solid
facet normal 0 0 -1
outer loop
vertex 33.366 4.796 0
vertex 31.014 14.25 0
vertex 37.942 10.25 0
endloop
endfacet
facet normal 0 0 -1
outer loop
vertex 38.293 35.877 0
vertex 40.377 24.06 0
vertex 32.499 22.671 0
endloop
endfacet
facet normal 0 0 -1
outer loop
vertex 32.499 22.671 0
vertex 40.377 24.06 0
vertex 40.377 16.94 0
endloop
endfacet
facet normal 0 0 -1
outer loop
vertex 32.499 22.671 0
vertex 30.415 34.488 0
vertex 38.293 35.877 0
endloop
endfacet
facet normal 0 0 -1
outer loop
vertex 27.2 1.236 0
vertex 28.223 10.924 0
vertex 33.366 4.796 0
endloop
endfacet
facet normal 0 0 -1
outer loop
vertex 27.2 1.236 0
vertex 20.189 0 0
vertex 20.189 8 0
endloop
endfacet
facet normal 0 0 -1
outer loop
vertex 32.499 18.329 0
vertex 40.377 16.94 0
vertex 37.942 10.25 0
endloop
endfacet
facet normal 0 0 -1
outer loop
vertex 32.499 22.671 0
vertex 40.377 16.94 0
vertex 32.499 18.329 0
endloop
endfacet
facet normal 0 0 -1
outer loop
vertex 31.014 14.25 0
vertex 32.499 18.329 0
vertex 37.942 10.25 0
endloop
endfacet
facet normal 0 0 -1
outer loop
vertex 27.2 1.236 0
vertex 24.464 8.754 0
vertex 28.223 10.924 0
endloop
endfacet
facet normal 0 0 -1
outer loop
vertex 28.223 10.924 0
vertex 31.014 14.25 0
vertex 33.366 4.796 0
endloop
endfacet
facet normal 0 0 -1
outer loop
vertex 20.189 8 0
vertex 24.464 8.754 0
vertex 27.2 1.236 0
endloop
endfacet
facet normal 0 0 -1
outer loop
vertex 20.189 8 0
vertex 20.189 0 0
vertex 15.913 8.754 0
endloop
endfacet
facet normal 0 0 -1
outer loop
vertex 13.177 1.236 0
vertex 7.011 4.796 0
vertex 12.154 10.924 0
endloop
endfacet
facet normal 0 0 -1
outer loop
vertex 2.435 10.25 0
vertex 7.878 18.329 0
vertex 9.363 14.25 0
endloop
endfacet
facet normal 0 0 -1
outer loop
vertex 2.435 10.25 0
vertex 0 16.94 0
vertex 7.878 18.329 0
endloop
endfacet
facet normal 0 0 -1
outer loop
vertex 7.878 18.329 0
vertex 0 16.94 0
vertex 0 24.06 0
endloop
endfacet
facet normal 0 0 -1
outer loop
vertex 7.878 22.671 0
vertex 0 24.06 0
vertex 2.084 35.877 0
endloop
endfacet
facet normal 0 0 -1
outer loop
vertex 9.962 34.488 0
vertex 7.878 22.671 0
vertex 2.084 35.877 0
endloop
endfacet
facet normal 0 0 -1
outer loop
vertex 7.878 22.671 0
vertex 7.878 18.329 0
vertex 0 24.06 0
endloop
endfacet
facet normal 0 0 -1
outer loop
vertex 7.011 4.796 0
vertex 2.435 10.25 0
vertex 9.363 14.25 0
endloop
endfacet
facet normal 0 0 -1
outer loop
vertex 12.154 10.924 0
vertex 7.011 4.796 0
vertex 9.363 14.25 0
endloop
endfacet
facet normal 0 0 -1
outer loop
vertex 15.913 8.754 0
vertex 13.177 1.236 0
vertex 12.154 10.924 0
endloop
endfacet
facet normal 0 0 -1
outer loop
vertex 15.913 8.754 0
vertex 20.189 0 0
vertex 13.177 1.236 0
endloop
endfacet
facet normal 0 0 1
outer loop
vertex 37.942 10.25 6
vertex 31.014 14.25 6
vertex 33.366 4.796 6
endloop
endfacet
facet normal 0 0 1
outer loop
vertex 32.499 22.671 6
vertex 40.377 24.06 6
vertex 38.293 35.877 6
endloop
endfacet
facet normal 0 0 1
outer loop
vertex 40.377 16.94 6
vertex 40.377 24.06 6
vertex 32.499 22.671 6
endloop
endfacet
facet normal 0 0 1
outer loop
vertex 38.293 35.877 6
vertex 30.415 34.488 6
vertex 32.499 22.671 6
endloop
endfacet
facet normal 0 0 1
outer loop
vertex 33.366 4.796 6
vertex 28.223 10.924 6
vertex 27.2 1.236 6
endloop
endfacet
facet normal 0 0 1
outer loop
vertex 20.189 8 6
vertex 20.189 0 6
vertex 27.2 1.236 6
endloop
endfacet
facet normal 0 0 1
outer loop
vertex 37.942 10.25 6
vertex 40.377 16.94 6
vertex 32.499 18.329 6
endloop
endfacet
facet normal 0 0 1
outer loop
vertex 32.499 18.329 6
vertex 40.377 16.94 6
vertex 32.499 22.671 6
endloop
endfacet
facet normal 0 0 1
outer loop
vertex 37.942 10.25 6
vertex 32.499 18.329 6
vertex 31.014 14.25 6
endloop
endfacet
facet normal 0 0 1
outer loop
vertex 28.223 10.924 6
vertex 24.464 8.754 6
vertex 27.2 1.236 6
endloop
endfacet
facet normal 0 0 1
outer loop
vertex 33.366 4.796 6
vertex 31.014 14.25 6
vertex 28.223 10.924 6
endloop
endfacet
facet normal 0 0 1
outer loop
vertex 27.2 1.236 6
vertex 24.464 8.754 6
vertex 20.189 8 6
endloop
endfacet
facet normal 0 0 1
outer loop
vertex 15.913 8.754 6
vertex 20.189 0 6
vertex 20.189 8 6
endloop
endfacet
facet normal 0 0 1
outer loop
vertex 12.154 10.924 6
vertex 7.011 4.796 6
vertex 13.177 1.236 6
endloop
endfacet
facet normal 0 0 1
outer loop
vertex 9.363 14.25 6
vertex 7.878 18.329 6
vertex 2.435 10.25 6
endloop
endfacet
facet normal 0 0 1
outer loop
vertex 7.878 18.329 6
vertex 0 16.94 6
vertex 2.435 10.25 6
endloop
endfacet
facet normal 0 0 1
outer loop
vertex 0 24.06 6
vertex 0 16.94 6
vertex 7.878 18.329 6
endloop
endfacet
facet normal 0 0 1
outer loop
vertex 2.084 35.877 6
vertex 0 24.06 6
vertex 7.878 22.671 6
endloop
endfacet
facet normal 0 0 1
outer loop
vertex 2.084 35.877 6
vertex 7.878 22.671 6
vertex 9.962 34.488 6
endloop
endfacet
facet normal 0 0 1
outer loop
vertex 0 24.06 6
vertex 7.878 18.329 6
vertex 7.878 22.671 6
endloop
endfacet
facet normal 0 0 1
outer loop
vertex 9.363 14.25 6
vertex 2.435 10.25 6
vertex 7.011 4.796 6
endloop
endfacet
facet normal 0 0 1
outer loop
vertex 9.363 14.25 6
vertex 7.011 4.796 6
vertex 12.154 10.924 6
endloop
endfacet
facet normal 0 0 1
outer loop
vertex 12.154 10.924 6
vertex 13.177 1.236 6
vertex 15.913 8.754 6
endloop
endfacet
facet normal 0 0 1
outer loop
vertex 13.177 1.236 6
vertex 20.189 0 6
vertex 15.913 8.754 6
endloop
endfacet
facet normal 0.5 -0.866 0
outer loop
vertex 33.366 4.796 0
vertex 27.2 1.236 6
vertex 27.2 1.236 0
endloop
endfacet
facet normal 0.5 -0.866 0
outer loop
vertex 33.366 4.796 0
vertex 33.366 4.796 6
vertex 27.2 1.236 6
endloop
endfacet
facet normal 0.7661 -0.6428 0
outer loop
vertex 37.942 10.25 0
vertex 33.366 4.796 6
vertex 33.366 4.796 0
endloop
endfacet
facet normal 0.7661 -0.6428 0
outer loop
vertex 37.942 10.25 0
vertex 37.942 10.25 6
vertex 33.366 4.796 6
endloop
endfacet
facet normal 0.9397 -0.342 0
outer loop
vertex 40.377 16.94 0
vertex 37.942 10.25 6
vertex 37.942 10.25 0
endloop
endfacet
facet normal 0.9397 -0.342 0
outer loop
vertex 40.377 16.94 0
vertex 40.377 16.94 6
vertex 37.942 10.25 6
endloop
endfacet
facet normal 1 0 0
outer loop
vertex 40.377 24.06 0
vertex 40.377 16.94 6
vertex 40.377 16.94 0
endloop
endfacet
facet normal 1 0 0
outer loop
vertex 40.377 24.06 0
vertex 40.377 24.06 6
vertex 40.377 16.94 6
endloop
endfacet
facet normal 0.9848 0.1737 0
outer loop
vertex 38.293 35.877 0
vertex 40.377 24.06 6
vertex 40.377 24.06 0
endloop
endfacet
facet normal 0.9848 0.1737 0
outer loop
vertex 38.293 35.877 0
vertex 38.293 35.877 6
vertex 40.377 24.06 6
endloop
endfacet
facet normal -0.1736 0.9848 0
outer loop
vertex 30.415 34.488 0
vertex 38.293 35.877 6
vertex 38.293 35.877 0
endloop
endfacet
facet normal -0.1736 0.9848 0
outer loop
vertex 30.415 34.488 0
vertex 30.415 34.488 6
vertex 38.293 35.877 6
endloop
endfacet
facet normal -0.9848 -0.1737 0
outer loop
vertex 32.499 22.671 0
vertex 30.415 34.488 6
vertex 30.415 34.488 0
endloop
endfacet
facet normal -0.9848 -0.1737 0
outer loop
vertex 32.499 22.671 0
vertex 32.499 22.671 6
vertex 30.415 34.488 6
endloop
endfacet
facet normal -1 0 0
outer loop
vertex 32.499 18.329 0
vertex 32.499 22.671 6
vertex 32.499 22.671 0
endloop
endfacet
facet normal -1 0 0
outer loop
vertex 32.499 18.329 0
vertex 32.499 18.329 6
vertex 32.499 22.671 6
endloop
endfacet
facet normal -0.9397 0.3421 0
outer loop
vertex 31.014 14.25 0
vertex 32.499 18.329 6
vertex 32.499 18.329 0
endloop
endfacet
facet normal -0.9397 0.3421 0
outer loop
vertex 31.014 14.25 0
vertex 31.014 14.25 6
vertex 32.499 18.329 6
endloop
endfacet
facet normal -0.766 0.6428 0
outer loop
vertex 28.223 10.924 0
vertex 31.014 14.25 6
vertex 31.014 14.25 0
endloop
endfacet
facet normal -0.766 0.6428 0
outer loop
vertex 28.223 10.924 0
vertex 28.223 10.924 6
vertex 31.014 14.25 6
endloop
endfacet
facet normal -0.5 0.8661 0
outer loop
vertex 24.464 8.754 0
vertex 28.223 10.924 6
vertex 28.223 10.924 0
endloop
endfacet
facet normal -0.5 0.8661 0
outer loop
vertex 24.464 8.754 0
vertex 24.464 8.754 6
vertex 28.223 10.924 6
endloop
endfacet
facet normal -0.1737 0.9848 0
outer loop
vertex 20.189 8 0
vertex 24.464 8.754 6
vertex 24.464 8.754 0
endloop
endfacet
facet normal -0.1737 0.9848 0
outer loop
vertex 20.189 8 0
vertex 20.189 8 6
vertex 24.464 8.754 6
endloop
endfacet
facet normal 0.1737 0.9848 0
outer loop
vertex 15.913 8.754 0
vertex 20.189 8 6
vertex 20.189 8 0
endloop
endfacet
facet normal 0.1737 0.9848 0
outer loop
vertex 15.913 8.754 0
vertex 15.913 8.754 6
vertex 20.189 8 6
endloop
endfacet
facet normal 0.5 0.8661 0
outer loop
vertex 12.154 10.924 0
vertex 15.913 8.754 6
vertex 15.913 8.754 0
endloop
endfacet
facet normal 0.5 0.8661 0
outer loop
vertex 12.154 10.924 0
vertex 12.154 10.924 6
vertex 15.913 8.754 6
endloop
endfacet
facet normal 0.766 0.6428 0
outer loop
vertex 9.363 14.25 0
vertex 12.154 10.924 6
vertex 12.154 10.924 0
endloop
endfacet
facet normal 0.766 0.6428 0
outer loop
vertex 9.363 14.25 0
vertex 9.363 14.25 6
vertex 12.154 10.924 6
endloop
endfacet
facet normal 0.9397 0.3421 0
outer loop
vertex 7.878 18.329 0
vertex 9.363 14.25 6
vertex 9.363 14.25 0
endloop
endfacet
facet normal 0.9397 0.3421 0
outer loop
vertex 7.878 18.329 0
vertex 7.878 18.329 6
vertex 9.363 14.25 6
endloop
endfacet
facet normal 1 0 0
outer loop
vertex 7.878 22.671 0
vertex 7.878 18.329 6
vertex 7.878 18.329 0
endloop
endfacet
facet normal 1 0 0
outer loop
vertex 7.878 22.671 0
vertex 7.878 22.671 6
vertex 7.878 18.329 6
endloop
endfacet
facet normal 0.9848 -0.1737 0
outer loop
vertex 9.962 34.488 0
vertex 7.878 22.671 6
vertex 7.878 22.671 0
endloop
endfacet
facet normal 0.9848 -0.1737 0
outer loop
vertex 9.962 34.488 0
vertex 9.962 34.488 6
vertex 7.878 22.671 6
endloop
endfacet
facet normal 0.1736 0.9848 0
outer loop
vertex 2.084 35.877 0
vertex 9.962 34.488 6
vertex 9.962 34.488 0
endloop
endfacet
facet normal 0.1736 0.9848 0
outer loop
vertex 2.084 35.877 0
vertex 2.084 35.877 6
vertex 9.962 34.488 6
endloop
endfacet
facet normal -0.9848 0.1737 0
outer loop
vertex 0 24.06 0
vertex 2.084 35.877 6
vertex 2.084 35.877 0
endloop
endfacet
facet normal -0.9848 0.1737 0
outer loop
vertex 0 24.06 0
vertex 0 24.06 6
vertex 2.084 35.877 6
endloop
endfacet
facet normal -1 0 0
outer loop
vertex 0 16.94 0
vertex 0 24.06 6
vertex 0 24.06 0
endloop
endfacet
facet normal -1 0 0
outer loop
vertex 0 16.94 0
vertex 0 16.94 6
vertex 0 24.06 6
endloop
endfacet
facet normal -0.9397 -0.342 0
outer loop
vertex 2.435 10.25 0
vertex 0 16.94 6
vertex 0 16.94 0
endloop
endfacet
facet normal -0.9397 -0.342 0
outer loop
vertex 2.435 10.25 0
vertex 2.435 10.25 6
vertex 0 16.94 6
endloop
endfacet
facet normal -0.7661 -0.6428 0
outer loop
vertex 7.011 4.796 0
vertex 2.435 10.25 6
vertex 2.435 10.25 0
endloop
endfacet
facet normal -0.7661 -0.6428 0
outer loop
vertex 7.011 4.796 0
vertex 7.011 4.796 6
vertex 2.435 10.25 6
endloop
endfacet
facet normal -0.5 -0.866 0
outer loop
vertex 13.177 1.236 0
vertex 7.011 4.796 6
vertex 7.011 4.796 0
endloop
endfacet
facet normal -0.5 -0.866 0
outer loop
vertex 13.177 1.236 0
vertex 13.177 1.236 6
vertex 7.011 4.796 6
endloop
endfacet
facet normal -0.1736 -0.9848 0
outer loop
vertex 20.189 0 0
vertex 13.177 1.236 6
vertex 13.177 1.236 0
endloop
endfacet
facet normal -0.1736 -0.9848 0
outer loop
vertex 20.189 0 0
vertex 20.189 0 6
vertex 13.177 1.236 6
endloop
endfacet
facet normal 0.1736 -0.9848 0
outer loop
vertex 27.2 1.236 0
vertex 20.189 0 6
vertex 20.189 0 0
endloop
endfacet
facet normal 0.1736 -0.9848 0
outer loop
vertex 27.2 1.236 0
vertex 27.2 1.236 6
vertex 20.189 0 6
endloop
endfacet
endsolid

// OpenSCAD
$fn = 32;

// ----------------------------------------------------------------------
// Clip blank: omega clip, 6 mm thick
// ----------------------------------------------------------------------

// --- parameters (mm) ---
profile_height = 6;       // extrusion height
profile_points = 26;      // points of the closed outline

profile = [[0, 24.06], [0, 16.94], [2.435, 10.25], [7.011, 4.796], [13.177, 1.236], [20.189, 0], [27.2, 1.236], [33.366, 4.796], [37.942, 10.25], [40.377, 16.94], [40.377, 24.06], [38.293, 35.877], [30.415, 34.488], [32.499, 22.671], [32.499, 18.329], [31.014, 14.25], [28.223, 10.924], [24.464, 8.754], [20.189, 8], [15.913, 8.754], [12.154, 10.924], [9.363, 14.25], [7.878, 18.329], [7.878, 22.671], [9.962, 34.488], [2.084, 35.877]];  // single closed polygon, 26 points, counter clockwise

// --- the one profile operation ---
linear_extrude(height = profile_height) polygon(points = profile);
